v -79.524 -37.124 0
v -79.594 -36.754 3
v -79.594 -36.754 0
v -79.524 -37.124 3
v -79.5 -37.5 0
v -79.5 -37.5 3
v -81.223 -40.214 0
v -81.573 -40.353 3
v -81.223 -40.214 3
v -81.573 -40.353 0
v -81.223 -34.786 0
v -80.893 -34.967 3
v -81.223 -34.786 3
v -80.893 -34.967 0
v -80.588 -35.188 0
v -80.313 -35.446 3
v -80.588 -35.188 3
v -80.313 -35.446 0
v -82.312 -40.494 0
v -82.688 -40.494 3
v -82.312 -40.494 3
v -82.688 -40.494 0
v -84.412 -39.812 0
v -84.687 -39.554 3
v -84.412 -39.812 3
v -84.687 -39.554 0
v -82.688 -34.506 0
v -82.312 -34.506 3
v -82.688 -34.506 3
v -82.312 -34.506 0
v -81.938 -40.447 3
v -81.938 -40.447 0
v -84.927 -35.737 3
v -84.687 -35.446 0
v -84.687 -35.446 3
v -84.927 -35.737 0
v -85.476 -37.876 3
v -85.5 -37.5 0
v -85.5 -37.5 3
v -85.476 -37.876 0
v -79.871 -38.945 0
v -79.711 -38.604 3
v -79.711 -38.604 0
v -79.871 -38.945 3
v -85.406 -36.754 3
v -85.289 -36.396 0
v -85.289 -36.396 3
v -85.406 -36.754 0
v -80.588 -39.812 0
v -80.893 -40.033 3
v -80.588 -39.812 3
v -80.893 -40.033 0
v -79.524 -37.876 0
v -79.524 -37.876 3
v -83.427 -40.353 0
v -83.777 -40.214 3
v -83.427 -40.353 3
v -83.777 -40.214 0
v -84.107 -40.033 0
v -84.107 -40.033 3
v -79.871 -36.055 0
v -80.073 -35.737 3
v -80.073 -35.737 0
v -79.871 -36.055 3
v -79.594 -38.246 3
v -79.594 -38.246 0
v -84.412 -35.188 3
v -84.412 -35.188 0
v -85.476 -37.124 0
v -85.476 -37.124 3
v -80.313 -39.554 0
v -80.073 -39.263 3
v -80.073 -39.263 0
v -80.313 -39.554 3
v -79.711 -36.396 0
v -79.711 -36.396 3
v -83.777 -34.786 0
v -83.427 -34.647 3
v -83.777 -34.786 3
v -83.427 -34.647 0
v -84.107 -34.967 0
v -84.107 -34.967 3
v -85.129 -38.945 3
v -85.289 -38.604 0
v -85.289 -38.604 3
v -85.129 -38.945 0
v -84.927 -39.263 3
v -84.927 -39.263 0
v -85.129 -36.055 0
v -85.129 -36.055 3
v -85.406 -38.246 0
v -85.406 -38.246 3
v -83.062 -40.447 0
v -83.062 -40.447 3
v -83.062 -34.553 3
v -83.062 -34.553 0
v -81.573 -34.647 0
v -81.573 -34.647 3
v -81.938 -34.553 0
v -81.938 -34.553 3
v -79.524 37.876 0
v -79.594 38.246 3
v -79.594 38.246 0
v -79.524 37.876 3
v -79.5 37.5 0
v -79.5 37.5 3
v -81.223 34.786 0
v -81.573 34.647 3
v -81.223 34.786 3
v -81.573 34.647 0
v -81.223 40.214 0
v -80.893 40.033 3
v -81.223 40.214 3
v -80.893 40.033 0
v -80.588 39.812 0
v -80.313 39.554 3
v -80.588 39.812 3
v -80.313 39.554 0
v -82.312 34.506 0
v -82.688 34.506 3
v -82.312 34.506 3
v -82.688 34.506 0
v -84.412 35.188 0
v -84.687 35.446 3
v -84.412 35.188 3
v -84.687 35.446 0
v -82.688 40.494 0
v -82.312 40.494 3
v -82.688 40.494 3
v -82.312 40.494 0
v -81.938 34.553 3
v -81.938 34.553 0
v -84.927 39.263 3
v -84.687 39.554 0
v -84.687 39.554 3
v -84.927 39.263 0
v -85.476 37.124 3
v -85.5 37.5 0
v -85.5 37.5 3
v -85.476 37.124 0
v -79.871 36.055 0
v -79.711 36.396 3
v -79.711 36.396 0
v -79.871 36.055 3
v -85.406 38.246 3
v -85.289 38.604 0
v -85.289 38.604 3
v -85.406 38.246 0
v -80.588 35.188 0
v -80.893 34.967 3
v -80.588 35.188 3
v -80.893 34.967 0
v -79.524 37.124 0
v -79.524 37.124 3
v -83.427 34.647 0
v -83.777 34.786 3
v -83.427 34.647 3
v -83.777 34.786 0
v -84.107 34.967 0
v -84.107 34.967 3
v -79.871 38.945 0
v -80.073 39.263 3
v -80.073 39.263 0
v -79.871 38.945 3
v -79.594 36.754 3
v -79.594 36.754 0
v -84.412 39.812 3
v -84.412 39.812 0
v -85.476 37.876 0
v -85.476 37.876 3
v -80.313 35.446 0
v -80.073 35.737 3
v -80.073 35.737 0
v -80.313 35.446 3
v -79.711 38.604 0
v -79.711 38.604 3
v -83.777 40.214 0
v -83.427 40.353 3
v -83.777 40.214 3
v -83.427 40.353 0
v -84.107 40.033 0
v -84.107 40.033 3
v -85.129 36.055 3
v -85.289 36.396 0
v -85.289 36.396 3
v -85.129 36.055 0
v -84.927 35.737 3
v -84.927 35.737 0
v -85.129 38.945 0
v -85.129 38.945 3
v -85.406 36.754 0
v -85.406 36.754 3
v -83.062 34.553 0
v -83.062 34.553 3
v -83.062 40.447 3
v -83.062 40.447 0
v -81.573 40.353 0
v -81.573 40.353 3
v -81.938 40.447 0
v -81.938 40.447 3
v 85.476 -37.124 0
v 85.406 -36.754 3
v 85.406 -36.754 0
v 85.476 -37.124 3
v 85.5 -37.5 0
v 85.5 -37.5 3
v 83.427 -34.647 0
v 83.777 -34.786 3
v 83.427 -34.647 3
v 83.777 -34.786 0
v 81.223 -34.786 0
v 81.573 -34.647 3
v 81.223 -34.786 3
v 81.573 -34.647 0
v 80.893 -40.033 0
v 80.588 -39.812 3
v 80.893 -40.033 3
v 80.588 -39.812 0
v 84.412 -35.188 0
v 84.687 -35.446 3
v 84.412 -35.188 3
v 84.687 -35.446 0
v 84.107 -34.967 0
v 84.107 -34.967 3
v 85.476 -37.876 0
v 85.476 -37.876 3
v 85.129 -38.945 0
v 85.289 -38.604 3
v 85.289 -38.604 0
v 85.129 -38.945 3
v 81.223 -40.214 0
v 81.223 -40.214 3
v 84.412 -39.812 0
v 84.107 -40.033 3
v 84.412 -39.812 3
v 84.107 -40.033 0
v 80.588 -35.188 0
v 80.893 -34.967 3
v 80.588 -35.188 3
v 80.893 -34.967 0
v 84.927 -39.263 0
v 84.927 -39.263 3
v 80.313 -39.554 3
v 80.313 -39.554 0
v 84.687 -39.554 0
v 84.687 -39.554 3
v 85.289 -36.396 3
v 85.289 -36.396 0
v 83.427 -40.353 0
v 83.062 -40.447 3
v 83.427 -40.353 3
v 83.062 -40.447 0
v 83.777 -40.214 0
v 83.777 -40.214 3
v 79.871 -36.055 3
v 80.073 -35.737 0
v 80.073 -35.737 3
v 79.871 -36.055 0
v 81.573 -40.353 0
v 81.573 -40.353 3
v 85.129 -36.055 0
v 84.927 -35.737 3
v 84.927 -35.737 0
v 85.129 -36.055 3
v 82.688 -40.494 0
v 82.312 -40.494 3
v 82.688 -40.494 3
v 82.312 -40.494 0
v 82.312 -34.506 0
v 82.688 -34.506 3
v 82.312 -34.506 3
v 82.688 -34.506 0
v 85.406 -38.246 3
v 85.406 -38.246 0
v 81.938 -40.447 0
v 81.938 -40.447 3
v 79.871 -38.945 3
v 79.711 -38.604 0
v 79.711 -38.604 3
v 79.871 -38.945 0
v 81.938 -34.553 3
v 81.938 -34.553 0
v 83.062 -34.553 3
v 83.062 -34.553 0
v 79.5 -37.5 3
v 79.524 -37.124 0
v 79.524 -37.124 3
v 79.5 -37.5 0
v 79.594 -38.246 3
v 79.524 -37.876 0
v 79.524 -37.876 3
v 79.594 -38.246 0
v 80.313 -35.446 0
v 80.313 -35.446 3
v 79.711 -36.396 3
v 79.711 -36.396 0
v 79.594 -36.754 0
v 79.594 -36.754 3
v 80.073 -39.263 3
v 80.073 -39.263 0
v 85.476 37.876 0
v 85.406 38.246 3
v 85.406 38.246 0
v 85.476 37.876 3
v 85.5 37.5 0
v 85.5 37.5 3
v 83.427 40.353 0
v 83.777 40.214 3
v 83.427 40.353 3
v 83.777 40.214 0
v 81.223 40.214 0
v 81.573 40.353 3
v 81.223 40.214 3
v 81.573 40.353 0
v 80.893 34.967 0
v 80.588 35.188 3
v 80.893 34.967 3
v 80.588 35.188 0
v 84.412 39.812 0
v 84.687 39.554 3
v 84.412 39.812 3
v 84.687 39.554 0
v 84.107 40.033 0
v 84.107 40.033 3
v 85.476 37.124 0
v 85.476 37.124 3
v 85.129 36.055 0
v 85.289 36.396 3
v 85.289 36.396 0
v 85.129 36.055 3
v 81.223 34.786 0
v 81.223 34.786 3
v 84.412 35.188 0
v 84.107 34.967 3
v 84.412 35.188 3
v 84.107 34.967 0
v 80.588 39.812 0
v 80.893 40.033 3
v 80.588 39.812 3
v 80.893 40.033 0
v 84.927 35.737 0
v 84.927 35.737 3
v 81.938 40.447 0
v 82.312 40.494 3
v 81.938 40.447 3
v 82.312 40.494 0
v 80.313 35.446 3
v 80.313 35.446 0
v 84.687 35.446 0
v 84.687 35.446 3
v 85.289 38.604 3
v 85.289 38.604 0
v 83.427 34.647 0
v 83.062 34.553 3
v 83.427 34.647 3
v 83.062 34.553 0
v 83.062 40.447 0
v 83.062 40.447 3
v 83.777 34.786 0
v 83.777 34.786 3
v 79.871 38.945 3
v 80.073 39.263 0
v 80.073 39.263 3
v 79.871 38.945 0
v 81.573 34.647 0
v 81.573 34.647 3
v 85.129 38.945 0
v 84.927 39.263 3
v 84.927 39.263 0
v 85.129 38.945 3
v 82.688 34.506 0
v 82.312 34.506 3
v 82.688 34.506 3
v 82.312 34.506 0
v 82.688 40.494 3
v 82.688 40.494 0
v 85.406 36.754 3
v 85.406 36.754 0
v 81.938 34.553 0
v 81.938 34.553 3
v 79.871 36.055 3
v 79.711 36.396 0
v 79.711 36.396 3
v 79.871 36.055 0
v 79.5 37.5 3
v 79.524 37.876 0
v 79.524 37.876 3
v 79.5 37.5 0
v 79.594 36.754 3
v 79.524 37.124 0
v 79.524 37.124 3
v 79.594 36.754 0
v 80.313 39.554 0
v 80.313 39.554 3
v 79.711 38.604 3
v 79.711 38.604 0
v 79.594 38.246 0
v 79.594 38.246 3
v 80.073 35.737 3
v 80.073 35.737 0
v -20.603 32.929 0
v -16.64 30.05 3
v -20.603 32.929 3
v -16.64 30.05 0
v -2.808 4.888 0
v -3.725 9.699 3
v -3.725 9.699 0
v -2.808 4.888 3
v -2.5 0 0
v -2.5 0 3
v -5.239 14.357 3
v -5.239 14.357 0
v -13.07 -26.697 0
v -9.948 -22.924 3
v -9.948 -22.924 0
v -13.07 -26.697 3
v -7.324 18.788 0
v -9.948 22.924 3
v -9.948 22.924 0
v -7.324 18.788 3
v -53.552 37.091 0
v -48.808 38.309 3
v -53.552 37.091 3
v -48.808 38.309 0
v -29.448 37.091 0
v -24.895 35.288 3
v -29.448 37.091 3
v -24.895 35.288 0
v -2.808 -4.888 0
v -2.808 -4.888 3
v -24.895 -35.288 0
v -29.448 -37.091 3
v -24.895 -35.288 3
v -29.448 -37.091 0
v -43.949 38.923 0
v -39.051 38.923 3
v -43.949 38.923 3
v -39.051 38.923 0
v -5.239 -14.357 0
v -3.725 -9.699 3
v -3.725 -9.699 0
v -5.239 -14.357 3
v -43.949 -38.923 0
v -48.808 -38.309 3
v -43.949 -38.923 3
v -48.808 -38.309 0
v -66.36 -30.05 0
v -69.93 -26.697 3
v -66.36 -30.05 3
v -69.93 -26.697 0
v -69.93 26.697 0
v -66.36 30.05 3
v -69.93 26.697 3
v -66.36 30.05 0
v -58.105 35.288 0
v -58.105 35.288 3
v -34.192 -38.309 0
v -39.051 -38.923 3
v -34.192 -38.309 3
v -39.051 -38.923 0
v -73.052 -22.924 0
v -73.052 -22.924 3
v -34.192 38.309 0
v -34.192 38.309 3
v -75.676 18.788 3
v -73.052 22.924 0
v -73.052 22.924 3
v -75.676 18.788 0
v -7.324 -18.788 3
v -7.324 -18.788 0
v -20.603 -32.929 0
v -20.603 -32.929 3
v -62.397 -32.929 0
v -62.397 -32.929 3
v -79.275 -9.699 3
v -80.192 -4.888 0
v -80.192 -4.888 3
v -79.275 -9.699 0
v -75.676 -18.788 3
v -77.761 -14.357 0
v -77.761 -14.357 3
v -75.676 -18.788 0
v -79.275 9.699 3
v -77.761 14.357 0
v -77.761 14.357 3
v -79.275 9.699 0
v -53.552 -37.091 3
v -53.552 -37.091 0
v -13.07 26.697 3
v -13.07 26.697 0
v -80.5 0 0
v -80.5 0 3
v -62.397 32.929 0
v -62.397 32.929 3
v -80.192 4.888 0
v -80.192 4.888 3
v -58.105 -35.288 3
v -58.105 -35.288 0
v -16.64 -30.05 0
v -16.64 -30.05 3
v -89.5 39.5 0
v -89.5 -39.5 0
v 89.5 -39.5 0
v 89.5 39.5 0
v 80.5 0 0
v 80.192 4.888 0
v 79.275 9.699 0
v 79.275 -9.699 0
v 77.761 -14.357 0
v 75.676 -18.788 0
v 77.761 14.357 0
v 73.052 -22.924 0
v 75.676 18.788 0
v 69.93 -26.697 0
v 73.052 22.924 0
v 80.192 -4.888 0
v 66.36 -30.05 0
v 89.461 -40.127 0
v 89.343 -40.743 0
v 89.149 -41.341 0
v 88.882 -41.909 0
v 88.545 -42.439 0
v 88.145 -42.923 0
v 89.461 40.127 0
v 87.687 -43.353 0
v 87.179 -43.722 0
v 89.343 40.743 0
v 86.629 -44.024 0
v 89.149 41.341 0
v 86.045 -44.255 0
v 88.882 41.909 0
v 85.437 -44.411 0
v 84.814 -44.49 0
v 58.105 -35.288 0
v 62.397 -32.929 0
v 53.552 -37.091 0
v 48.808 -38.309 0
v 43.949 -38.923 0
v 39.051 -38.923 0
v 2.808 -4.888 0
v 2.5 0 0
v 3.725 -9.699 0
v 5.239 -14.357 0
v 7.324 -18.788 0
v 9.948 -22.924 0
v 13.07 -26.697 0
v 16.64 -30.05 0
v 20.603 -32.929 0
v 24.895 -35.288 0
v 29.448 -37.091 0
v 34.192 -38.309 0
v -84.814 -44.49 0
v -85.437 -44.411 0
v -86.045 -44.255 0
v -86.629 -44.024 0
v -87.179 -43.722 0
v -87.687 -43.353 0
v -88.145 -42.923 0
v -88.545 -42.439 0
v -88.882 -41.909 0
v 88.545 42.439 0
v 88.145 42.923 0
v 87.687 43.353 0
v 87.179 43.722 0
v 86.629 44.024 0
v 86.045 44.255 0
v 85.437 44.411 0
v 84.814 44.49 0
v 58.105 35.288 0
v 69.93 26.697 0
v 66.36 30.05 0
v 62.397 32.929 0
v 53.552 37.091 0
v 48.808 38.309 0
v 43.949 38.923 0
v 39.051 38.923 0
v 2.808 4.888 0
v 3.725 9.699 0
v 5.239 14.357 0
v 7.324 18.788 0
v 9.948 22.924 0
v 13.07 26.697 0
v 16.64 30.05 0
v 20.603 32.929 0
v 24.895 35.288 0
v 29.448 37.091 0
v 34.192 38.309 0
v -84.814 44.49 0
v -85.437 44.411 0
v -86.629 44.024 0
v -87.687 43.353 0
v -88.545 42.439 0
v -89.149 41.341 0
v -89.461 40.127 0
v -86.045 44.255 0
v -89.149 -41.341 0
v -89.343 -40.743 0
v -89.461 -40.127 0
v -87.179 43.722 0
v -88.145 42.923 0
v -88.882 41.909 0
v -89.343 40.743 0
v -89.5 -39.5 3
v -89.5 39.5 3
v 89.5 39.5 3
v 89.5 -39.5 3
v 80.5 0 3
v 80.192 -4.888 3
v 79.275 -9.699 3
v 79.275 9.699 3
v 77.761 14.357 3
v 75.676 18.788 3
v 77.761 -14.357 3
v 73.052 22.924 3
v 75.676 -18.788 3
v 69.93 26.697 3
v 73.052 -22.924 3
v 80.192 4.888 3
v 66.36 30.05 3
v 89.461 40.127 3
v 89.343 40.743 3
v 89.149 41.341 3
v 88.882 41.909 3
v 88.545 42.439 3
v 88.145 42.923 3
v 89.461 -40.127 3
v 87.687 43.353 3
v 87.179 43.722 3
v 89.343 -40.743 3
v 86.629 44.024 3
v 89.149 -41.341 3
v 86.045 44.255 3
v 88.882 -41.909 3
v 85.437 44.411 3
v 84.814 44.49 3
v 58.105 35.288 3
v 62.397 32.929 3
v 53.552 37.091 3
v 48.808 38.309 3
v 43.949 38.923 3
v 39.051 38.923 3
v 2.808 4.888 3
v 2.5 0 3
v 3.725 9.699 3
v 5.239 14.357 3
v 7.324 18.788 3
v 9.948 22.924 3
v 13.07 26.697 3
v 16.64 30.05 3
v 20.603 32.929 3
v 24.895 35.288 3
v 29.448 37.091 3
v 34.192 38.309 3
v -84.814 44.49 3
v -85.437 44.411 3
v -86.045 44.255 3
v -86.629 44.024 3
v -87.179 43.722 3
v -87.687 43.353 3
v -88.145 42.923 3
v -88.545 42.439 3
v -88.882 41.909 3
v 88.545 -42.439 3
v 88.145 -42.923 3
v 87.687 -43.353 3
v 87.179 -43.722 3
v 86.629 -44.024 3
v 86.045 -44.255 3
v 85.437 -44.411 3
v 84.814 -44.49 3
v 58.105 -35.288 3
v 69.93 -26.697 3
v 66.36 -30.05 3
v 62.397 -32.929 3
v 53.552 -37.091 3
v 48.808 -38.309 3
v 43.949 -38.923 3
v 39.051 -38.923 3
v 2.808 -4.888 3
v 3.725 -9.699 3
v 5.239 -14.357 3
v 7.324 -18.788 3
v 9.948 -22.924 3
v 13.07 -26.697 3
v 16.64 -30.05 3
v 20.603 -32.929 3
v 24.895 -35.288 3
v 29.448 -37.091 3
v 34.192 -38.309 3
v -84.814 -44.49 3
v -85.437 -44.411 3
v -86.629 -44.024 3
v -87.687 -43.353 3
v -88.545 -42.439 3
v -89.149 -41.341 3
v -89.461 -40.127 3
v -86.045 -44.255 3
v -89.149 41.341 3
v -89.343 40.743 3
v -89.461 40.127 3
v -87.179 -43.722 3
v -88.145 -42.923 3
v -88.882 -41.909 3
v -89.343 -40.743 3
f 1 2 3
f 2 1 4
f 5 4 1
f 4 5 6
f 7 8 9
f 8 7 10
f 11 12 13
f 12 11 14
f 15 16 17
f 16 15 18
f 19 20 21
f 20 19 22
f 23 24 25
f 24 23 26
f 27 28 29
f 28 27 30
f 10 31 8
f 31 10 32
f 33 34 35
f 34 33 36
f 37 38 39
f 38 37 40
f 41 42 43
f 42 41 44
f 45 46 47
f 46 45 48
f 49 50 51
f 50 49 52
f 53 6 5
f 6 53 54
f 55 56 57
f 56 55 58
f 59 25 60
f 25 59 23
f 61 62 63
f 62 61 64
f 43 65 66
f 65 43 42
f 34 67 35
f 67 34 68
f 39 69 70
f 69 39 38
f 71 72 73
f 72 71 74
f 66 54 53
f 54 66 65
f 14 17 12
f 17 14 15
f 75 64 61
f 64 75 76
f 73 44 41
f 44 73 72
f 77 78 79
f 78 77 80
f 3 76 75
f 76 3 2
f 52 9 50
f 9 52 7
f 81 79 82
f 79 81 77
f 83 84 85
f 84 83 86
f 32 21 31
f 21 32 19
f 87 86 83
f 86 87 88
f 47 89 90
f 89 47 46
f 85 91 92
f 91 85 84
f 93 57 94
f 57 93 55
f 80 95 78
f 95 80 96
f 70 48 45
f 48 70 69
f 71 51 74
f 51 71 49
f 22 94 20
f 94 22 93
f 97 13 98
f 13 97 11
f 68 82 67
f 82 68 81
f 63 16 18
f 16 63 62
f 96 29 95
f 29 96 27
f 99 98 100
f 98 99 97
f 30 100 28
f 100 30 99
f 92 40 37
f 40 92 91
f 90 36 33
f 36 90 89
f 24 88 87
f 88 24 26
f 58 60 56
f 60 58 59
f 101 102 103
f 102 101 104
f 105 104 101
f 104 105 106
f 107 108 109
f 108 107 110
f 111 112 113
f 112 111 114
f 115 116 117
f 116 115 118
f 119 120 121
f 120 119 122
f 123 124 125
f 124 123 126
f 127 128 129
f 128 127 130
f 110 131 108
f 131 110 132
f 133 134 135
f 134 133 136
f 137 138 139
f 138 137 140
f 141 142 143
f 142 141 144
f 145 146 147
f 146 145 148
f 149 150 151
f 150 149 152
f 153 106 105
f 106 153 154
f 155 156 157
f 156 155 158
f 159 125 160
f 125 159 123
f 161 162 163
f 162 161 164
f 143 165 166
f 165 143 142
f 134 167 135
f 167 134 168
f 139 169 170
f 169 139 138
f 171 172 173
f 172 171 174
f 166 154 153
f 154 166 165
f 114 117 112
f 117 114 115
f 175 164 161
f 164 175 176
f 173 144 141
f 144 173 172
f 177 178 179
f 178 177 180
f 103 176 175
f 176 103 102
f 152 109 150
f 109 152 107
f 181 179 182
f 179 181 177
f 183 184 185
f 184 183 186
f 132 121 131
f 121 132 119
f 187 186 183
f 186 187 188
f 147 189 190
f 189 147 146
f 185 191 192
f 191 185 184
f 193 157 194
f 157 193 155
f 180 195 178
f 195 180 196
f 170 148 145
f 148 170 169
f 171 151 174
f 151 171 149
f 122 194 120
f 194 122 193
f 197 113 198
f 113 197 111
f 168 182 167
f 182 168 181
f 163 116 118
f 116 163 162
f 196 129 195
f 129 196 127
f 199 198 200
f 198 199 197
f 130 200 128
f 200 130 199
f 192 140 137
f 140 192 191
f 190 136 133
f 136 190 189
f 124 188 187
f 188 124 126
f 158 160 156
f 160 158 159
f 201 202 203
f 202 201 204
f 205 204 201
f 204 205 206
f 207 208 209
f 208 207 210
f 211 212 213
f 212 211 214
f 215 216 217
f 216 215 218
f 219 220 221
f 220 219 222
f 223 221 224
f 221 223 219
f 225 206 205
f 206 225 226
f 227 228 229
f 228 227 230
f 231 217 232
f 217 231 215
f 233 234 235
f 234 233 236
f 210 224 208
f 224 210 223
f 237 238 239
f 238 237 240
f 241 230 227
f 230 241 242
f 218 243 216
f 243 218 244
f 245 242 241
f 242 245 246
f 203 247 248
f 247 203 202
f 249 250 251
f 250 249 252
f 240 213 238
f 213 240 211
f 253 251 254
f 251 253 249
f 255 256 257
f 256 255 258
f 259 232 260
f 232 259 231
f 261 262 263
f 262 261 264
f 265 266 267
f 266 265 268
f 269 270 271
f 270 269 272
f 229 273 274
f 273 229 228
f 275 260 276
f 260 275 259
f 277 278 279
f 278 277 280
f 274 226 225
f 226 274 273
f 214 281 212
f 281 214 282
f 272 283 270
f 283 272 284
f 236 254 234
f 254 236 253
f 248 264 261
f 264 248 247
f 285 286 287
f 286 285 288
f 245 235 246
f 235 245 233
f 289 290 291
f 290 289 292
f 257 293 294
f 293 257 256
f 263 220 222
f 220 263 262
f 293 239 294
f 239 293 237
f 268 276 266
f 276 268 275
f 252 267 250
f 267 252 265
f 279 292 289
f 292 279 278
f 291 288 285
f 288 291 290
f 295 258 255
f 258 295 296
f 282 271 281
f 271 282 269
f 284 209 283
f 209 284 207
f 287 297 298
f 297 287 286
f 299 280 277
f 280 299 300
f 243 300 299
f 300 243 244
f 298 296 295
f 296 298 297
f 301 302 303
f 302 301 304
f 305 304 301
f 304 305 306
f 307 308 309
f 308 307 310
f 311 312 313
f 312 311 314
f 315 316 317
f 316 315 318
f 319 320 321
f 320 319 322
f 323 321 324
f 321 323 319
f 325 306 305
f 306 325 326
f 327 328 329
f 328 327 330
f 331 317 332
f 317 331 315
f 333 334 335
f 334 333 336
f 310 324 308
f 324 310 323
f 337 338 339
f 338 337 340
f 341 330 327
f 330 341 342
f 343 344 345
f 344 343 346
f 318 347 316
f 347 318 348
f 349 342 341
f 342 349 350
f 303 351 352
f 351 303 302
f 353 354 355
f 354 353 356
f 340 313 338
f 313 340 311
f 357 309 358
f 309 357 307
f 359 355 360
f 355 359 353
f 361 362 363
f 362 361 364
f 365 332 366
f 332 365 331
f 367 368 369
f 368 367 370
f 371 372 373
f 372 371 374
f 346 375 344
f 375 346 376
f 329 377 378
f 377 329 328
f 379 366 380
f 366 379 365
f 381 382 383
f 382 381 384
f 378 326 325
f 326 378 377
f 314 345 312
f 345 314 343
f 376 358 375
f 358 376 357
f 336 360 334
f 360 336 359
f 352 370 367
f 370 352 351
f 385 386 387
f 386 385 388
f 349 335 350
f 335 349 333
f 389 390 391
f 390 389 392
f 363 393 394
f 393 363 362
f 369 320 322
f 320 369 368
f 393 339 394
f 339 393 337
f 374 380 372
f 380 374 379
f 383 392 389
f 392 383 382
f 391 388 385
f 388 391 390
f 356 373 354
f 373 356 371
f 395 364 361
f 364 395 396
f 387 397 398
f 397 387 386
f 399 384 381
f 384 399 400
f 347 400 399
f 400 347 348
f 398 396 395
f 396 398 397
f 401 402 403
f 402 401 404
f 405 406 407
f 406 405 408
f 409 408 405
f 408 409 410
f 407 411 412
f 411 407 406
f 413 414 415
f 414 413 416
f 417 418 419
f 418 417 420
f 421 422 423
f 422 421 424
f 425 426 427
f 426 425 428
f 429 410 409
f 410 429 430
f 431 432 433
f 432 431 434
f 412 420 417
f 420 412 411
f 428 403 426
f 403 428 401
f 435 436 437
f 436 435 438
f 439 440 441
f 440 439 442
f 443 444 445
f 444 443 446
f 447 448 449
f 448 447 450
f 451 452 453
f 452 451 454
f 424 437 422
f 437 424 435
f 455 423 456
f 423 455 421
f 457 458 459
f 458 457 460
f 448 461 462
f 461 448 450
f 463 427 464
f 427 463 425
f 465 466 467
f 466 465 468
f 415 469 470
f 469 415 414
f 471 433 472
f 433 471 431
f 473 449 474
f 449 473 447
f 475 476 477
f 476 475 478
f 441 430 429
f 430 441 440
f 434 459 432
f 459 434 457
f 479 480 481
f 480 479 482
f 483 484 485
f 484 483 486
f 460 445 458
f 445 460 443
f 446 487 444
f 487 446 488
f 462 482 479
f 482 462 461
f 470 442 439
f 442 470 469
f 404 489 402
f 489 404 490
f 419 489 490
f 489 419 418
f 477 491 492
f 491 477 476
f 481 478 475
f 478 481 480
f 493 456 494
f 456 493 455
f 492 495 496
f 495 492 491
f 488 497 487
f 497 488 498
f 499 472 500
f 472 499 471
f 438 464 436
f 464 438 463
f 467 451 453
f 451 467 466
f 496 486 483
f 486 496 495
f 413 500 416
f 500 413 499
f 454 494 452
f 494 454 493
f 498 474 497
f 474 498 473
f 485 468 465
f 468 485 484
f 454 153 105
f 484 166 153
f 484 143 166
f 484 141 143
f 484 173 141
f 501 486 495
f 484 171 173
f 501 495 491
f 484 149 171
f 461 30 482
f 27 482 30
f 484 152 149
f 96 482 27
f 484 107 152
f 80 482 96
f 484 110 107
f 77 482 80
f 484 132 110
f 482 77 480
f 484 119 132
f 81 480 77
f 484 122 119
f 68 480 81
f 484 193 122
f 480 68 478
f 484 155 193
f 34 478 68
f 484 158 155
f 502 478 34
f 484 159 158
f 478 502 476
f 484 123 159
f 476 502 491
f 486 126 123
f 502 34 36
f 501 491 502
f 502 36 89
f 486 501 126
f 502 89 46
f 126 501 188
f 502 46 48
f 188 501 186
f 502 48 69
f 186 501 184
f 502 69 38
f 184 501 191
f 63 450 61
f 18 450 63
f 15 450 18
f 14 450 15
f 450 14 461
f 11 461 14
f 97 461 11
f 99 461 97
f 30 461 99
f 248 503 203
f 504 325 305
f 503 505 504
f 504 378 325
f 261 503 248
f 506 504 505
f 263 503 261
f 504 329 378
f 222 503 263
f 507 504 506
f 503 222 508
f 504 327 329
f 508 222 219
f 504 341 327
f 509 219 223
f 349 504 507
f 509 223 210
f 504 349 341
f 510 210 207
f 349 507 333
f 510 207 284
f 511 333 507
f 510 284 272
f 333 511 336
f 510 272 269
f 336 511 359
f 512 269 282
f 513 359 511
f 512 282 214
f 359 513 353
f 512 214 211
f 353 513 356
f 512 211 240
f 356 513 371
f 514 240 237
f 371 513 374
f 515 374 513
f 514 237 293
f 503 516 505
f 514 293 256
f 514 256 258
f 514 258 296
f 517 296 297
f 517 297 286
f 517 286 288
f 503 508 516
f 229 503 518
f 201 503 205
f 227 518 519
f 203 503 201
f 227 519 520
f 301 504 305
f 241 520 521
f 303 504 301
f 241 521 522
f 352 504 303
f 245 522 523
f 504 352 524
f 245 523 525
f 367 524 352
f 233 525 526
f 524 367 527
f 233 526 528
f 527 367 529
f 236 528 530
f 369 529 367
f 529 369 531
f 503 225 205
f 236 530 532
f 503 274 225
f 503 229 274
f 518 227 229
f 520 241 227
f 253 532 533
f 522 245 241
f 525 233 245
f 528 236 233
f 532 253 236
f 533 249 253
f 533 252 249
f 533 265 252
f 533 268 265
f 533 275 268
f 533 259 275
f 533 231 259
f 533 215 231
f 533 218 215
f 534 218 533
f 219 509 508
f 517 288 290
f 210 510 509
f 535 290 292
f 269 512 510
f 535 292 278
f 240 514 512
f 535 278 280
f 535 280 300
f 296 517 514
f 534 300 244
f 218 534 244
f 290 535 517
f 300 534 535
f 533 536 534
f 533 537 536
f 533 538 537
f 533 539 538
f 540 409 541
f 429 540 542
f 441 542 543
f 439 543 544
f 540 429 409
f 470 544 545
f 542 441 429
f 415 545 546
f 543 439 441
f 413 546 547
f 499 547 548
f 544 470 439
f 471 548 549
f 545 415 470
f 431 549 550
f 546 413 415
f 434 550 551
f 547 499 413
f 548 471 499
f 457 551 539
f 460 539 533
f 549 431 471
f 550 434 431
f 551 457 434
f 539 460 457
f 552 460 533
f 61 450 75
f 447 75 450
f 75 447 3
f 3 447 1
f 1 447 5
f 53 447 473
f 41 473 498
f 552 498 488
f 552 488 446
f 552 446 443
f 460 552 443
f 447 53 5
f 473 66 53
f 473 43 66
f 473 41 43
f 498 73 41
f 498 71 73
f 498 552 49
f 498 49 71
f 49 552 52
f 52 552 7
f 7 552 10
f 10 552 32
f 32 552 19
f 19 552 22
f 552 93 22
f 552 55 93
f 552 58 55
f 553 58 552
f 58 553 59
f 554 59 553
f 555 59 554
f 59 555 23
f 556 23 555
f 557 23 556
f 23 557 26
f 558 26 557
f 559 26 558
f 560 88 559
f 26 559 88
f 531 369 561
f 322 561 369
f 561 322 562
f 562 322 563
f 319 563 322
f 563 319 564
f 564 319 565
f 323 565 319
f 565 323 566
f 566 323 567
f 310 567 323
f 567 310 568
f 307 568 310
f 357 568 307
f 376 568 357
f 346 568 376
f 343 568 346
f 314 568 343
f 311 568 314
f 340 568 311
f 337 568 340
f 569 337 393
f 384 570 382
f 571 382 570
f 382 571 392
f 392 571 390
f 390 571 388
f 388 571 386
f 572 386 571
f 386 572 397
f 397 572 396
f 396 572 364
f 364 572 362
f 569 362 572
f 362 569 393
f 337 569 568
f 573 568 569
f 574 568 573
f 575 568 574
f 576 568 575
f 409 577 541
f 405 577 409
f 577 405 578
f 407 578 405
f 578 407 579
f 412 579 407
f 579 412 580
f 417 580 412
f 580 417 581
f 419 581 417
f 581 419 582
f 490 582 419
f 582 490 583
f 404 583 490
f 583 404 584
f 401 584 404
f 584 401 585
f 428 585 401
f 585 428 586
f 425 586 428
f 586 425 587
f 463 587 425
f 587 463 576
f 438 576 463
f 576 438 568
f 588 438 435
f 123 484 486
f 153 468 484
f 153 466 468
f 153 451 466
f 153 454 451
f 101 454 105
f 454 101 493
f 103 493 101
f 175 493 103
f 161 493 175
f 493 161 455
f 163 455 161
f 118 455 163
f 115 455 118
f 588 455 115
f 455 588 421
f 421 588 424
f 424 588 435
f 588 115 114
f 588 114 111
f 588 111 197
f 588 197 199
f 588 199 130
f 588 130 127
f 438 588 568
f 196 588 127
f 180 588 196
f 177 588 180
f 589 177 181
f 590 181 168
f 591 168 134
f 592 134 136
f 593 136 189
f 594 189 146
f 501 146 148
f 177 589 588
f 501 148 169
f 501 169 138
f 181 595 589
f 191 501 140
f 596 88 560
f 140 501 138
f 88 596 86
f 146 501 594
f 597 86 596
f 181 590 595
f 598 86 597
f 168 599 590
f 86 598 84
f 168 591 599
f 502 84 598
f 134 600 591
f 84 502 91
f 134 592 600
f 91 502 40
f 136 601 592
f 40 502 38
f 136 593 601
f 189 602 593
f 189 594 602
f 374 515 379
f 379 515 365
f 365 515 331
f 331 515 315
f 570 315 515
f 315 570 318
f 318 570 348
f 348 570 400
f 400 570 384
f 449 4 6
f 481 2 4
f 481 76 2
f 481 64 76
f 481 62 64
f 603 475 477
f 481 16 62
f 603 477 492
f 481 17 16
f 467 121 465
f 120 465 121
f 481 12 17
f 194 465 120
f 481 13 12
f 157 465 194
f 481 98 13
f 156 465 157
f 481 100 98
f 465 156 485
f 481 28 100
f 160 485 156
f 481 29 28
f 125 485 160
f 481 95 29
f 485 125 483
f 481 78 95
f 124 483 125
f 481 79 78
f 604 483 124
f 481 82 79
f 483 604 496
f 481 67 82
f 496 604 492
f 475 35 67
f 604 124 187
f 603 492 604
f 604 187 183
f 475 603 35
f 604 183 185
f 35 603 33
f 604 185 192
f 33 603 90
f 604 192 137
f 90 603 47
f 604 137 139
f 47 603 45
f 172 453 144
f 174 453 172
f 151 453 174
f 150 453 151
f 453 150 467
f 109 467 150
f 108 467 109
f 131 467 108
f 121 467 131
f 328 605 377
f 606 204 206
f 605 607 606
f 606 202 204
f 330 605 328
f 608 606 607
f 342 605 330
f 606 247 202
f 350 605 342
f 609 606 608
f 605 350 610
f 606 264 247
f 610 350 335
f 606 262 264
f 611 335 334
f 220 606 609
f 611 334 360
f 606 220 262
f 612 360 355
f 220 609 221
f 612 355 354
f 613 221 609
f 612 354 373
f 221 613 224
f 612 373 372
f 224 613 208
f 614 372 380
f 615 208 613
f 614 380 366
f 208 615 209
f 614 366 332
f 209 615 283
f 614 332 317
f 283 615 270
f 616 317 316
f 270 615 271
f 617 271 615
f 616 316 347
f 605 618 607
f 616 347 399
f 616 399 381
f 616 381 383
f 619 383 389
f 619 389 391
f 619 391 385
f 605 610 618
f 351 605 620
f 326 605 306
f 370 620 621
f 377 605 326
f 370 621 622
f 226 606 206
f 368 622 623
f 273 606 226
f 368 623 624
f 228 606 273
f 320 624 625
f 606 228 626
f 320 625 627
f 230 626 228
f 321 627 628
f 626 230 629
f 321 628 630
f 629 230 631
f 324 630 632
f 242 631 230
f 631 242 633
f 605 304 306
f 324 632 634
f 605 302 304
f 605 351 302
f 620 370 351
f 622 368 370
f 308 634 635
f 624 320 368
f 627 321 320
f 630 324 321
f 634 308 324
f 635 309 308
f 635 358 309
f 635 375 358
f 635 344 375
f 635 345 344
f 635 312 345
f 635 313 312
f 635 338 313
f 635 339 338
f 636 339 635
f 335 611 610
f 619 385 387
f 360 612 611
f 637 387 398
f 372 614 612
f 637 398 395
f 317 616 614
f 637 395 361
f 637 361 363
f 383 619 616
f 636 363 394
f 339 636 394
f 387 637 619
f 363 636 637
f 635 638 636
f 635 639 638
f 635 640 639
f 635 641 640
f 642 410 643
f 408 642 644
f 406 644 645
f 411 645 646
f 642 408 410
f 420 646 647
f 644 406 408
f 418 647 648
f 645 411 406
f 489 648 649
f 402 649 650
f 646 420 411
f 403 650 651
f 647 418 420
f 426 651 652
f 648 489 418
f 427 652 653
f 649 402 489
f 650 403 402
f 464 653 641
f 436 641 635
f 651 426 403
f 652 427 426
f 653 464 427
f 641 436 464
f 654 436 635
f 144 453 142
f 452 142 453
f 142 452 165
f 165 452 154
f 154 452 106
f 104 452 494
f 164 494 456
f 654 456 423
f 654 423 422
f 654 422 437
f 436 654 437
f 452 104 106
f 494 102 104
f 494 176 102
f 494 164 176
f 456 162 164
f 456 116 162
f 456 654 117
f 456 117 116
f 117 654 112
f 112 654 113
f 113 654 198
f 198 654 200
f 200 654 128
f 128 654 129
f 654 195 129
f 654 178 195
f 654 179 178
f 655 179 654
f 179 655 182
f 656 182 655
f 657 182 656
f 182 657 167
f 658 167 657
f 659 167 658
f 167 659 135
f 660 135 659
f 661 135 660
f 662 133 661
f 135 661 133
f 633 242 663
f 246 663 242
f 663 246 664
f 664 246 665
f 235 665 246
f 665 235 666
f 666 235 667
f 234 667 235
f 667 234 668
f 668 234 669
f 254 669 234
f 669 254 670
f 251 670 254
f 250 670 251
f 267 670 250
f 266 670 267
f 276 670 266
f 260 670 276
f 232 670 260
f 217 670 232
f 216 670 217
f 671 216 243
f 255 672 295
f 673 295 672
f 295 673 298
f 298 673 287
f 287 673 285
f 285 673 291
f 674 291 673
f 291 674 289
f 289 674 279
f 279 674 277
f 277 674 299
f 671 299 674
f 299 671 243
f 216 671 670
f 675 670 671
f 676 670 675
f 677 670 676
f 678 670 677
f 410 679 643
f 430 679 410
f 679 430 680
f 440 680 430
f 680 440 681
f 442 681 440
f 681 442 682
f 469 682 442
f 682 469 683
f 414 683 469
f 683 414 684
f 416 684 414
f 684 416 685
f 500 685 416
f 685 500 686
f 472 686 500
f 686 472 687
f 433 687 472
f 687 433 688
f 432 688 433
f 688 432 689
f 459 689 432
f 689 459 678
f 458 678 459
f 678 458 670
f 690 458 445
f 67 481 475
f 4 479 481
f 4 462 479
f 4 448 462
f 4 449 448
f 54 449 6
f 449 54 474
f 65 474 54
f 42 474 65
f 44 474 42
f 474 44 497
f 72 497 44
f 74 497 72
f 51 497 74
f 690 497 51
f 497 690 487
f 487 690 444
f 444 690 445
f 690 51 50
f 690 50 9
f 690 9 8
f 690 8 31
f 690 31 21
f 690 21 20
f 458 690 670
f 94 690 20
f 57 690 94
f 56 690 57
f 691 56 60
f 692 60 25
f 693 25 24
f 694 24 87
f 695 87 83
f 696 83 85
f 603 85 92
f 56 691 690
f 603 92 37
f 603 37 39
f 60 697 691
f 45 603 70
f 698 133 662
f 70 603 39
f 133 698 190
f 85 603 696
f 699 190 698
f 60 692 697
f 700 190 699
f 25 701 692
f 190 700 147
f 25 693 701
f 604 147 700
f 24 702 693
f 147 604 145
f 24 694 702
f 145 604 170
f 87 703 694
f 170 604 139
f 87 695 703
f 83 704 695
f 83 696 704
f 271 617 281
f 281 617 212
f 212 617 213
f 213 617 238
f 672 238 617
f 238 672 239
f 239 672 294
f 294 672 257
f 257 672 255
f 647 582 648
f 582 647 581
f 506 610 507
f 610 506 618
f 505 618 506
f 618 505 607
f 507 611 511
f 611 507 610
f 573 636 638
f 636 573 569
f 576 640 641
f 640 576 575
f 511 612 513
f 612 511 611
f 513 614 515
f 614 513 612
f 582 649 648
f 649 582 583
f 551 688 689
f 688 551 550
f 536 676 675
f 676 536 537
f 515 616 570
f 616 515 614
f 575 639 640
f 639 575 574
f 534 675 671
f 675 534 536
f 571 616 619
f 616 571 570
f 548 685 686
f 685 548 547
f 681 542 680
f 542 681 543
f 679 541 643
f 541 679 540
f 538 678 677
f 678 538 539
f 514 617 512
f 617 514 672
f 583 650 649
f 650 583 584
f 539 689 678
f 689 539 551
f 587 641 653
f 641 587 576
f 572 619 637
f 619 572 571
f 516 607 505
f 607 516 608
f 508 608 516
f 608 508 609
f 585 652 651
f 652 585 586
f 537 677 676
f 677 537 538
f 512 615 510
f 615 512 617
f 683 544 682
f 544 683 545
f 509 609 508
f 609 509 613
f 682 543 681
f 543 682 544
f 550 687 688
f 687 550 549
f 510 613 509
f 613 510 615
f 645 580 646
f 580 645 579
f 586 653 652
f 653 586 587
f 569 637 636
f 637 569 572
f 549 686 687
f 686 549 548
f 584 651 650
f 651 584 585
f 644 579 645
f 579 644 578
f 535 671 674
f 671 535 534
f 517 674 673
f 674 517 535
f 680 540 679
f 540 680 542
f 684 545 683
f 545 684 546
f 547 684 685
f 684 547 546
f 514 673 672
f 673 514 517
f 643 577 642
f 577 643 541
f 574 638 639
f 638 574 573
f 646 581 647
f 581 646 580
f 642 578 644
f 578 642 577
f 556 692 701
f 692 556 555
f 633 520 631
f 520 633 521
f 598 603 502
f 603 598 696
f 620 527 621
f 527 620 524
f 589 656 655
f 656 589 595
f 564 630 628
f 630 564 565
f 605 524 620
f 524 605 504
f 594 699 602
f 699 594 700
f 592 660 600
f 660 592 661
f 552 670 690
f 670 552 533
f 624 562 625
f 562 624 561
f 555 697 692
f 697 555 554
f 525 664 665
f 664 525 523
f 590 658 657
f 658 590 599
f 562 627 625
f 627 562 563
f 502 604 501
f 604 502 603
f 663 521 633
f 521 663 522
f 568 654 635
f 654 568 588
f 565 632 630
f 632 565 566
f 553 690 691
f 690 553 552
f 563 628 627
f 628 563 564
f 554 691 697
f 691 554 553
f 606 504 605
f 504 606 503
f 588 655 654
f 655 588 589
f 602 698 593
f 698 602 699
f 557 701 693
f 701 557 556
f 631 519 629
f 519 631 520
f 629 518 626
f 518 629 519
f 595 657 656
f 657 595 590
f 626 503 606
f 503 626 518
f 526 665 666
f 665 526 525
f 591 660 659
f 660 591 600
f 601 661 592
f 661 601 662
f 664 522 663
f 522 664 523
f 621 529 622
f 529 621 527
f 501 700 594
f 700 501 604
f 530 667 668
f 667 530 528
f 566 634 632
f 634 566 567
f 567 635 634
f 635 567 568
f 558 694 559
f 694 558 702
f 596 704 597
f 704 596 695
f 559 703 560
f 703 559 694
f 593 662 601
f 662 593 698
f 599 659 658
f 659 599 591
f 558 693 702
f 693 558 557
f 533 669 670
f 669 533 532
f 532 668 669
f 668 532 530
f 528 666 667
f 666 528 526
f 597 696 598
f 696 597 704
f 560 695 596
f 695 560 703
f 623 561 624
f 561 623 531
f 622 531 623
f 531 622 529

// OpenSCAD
$fn = 50;


difference() {
	union() {
		hull() {
			translate(v = [-84.5000000000, 39.5000000000, 0]) {
				cylinder(h = 3, r = 5);
			}
			translate(v = [84.5000000000, 39.5000000000, 0]) {
				cylinder(h = 3, r = 5);
			}
			translate(v = [-84.5000000000, -39.5000000000, 0]) {
				cylinder(h = 3, r = 5);
			}
			translate(v = [84.5000000000, -39.5000000000, 0]) {
				cylinder(h = 3, r = 5);
			}
		}
	}
	union() {
		#translate(v = [-82.5000000000, -37.5000000000, -100.0000000000]) {
			cylinder(h = 200, r = 3.0000000000);
		}
		#translate(v = [-82.5000000000, 37.5000000000, -100.0000000000]) {
			cylinder(h = 200, r = 3.0000000000);
		}
		#translate(v = [82.5000000000, -37.5000000000, -100.0000000000]) {
			cylinder(h = 200, r = 3.0000000000);
		}
		#translate(v = [82.5000000000, 37.5000000000, -100.0000000000]) {
			cylinder(h = 200, r = 3.0000000000);
		}
		#translate(v = [-41.5000000000, 0, 0]) {
			cylinder(h = 3, r = 39.0000000000);
		}
		#translate(v = [41.5000000000, 0, 0]) {
			cylinder(h = 3, r = 39.0000000000);
		}
	}
}
